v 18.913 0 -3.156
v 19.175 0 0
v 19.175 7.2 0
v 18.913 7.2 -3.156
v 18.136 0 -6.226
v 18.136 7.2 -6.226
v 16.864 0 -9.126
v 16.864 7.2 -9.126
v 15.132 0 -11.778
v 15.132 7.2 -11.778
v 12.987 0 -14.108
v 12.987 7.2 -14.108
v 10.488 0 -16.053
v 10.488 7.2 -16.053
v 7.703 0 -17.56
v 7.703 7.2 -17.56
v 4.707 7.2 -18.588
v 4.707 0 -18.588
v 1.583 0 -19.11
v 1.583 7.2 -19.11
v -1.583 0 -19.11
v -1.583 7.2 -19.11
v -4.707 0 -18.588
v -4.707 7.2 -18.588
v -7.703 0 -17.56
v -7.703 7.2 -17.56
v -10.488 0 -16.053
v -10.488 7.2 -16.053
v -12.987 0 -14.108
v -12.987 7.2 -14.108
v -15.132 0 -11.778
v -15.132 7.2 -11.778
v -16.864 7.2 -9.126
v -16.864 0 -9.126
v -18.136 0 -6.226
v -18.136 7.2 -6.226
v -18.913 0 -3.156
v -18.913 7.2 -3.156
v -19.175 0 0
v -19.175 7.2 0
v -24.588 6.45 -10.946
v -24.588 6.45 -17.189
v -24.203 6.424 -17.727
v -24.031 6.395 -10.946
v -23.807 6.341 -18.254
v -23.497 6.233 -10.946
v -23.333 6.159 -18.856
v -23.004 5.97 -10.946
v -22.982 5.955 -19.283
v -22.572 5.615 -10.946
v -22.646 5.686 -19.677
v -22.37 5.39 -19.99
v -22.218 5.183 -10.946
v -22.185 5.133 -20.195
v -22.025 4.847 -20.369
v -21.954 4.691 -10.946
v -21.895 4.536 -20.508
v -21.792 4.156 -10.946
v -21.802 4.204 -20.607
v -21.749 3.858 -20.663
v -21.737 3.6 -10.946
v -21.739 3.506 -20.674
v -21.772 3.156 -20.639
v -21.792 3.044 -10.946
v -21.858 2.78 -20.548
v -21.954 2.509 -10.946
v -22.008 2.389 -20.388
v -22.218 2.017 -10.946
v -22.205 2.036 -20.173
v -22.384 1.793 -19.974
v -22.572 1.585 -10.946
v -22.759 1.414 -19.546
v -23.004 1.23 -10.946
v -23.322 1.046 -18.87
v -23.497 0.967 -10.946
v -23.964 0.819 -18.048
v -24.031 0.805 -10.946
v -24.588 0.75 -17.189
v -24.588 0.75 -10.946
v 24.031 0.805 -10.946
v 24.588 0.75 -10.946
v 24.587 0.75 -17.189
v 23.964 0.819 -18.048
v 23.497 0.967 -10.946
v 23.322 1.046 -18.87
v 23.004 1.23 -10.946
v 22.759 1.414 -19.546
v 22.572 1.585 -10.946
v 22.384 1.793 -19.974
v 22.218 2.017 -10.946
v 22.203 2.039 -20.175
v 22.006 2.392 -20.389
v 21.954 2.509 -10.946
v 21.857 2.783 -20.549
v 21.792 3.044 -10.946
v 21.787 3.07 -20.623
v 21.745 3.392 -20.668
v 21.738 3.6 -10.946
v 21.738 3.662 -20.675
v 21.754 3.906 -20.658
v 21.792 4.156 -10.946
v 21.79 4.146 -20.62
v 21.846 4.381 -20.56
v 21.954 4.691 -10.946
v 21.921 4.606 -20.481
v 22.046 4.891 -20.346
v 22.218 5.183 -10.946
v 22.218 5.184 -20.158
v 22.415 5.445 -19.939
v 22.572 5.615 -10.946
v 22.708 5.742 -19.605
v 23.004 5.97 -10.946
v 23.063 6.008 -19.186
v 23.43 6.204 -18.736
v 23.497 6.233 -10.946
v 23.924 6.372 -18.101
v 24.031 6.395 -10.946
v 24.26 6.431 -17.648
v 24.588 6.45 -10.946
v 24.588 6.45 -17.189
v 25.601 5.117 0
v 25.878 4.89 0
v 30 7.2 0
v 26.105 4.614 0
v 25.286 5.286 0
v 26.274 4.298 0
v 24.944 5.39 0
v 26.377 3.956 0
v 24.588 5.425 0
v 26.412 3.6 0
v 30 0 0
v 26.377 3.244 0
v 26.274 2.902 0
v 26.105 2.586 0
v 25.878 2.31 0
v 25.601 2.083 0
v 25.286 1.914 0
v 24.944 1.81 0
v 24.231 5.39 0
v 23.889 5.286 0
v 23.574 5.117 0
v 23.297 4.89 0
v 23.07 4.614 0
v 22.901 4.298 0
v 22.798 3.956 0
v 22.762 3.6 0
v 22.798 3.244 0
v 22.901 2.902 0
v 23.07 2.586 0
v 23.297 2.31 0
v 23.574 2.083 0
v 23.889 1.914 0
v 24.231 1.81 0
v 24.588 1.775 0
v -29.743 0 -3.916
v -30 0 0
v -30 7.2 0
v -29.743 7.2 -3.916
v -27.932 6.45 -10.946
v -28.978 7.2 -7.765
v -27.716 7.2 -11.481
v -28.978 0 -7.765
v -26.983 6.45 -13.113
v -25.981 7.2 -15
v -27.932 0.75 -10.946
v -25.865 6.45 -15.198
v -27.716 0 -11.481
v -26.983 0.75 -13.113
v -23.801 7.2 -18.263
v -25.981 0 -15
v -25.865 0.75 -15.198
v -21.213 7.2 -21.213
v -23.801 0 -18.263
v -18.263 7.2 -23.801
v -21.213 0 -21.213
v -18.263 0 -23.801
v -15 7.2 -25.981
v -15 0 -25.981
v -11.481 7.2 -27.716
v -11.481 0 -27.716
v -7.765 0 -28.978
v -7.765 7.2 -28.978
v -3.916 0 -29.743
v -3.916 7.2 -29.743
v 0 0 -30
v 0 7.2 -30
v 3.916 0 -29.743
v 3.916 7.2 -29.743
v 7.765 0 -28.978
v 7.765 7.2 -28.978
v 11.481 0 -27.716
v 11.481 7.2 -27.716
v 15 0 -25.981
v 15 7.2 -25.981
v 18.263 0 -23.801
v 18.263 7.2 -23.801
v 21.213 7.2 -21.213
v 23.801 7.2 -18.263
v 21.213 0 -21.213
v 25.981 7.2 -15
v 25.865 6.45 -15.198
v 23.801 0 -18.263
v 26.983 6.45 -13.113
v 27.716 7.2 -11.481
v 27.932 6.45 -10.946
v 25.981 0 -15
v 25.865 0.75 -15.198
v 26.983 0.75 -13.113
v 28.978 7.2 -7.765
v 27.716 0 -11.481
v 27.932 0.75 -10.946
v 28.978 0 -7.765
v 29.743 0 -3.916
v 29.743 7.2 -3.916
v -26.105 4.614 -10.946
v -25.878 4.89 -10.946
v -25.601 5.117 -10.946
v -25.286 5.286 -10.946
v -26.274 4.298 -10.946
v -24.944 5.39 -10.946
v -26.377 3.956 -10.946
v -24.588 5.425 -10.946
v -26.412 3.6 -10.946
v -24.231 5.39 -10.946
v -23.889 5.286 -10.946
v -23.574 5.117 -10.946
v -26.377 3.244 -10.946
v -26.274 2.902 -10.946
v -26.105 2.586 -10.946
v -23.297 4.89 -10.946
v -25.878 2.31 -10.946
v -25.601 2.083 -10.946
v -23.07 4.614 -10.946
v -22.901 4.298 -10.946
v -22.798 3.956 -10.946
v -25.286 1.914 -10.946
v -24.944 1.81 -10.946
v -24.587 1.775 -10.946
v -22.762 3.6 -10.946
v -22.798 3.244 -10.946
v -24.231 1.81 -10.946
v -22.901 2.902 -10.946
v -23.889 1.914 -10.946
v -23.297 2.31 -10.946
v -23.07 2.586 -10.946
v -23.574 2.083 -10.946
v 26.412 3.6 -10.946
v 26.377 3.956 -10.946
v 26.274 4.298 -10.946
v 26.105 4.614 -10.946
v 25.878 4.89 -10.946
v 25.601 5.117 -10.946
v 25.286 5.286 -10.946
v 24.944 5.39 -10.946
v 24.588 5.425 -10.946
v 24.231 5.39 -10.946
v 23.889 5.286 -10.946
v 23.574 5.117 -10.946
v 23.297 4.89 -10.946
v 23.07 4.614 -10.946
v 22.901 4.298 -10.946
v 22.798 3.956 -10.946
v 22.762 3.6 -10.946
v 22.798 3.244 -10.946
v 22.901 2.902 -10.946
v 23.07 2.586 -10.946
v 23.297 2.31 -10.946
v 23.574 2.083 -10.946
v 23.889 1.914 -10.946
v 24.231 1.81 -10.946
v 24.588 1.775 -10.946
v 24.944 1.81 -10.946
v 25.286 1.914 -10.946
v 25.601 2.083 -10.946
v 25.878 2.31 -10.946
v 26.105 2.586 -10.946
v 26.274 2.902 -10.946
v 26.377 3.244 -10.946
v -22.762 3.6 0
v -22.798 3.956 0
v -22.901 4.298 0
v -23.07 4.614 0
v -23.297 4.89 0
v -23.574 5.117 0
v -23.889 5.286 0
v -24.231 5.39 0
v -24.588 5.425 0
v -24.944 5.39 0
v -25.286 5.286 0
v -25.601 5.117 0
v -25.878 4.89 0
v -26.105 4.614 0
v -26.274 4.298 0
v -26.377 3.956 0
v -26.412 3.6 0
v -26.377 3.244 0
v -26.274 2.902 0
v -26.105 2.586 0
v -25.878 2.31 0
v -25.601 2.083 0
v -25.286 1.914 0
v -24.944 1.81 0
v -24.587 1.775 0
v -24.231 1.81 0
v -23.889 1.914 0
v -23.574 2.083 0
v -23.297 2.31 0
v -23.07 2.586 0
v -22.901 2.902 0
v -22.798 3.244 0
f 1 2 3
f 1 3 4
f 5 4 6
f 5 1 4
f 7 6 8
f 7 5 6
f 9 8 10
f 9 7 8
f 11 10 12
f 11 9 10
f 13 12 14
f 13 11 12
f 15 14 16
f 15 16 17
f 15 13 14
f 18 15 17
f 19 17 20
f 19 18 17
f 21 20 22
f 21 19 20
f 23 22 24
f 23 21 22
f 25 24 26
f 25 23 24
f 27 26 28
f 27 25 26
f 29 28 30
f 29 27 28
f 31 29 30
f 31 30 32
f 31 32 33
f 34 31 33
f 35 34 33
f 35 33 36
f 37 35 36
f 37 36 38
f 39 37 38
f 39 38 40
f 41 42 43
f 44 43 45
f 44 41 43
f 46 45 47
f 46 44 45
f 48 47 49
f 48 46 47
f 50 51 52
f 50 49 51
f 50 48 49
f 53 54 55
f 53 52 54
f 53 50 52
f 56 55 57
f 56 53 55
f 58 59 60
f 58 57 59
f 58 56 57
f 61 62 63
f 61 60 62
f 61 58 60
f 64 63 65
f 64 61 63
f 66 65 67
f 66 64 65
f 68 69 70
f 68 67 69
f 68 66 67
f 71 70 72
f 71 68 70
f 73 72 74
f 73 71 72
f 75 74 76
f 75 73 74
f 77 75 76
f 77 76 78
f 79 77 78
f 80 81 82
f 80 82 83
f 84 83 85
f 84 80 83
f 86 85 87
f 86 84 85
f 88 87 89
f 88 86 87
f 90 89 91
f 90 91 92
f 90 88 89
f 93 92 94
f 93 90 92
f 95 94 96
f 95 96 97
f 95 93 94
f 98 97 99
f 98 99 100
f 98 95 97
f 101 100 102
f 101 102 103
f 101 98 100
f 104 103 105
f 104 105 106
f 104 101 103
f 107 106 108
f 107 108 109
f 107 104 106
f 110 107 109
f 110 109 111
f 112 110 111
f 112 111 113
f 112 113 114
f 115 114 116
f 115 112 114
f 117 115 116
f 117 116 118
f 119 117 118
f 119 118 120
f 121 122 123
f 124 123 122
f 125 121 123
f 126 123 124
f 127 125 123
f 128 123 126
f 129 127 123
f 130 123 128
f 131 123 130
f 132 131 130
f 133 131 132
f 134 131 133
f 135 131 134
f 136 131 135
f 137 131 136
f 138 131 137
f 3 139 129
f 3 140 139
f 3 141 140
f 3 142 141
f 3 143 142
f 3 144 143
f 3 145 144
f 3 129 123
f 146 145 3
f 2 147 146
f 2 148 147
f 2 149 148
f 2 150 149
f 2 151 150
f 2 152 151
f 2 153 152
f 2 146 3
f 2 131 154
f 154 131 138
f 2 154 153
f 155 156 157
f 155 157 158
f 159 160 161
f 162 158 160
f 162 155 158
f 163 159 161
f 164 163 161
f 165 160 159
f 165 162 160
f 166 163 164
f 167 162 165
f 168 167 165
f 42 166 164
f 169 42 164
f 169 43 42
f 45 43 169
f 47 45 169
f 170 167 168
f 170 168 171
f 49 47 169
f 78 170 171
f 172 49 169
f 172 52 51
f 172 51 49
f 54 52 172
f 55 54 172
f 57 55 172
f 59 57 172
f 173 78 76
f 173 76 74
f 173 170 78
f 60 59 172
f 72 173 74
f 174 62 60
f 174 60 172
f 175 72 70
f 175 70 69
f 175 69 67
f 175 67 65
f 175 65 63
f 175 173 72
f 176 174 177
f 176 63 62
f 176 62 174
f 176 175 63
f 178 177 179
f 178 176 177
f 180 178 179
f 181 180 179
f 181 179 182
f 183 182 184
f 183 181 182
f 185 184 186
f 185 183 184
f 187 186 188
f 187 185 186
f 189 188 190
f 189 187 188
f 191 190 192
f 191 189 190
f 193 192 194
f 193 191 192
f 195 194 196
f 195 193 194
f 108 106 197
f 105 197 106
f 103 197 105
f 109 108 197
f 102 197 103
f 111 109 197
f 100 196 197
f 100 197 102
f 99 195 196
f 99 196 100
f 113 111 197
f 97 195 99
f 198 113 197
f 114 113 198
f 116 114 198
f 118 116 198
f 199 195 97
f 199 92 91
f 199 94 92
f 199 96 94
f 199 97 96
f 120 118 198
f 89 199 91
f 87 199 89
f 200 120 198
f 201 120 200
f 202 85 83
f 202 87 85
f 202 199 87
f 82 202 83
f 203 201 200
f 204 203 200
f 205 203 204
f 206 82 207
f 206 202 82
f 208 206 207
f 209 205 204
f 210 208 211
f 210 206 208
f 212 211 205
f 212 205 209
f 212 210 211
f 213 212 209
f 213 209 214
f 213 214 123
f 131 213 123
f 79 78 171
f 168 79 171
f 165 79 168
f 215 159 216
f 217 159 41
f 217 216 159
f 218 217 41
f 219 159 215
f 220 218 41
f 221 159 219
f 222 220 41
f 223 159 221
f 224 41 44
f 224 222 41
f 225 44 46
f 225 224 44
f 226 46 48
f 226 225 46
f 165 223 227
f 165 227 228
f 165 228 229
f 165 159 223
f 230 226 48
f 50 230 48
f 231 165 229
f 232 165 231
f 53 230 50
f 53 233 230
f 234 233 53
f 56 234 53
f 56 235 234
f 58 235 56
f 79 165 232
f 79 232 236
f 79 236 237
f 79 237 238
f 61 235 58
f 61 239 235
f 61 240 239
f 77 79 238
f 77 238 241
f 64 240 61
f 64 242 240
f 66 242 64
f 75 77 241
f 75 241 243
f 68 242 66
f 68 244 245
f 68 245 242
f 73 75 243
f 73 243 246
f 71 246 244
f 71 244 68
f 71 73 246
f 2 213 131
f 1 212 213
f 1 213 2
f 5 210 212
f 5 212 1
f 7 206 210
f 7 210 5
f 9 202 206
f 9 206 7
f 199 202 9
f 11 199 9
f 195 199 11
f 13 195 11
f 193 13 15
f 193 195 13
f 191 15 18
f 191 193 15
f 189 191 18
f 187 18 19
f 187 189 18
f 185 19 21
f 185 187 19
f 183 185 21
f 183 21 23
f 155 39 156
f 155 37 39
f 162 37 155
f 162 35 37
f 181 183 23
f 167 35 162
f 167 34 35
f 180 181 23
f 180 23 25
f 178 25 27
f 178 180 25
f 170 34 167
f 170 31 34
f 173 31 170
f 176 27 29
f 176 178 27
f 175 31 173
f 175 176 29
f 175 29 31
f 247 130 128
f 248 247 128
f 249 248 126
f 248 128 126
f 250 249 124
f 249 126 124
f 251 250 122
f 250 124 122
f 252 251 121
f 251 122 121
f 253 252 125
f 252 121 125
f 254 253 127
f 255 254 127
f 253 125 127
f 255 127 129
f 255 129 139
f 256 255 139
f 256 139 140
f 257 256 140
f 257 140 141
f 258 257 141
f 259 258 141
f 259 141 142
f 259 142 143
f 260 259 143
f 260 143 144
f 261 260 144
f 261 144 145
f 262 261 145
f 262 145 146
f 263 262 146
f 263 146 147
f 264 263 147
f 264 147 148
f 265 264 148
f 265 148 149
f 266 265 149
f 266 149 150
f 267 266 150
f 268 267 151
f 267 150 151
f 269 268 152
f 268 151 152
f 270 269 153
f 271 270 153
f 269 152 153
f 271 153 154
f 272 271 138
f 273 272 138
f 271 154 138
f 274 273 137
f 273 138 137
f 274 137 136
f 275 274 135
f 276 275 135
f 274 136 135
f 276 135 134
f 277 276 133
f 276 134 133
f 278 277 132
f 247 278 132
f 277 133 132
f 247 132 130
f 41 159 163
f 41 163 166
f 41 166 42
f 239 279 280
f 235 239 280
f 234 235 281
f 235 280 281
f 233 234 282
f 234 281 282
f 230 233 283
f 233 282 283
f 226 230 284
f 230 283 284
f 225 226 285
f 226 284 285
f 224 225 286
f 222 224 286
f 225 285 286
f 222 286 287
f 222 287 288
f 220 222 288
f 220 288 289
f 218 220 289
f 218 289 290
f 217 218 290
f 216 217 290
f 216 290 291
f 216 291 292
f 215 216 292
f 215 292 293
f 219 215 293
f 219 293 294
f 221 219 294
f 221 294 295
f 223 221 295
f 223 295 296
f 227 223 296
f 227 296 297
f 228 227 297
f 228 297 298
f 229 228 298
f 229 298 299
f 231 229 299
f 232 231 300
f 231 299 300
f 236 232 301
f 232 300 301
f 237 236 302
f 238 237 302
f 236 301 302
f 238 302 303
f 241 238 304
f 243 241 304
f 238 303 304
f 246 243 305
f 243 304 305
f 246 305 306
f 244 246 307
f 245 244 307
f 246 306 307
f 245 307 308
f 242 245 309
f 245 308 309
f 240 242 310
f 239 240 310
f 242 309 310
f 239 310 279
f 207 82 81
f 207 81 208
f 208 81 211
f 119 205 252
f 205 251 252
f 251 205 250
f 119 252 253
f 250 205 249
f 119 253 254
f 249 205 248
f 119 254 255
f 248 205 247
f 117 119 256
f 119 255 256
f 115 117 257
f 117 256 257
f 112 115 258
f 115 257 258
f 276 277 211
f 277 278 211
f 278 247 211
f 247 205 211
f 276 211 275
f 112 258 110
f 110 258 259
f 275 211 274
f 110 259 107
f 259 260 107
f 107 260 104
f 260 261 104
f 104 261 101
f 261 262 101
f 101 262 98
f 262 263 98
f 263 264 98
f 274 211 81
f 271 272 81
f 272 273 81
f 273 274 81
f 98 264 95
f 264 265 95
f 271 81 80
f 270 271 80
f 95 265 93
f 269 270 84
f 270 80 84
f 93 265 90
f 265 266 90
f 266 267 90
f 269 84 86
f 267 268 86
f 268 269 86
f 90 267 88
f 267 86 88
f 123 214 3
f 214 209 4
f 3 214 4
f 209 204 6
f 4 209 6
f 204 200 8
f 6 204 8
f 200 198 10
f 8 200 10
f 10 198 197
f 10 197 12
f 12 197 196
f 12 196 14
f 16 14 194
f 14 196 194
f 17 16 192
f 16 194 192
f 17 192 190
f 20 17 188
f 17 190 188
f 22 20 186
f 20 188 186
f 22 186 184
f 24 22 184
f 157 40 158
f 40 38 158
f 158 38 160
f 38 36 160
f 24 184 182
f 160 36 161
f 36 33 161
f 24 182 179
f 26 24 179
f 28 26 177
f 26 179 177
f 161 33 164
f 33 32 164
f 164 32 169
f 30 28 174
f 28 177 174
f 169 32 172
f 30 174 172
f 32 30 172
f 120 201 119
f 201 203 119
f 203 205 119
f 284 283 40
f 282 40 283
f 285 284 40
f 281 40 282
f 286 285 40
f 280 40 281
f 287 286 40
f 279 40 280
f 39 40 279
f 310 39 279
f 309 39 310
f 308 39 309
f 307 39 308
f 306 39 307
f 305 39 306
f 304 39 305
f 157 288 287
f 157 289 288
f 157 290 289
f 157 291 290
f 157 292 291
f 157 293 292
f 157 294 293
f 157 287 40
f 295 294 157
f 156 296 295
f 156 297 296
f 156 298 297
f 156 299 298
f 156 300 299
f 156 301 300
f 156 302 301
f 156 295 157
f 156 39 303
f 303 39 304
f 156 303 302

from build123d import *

# Parameters (mm, degrees)
BOSS_EXTRUDE1_DEPTH     = 7.2
SKETCH2_R               = 1.825
CUT_EXTRUDE1_DEPTH      = 47.2
CUT_EXTRUDE3_DEPTH      = 5
CUT_EXTRUDE3_DEPTH_BACK = 5.5
SKETCH3_R               = 2.85
CUT_EXTRUDE4_DEPTH      = 20


with BuildPart() as part:
    # Sketch1 → Boss-Extrude1 (new body)
    with BuildSketch(Plane(origin=(0, 0, 0), x_dir=(1, 0, 0), z_dir=(0, 1, 0))):
        with BuildLine():
            Line((-19.175, 0), (-30, 0))
            ThreePointArc((-30, 0), (0, 30), (30, 0))
            Line((30, 0), (19.175, 0))
            ThreePointArc((19.175, 0), (0, 19.175), (-19.175, 0))
        make_face()
    extrude(amount=BOSS_EXTRUDE1_DEPTH)

    # Sketch2 → Cut-Extrude1 (cut)
    with BuildSketch(Plane.XY):
        with Locations((-24.5875, 3.6)):
            Circle(SKETCH2_R)
        with Locations((24.5875, 3.6)):
            Circle(SKETCH2_R)
    extrude(amount=-CUT_EXTRUDE1_DEPTH, mode=Mode.SUBTRACT)

    # Sketch3 → Cut-Extrude3 (cut, two sides: drawn at the far end of the back side and taken through both)
    with BuildSketch(Plane(origin=(0, 0, -16.445655164), x_dir=(0, -1, 0), z_dir=(0, 0, -1)).offset(-CUT_EXTRUDE3_DEPTH_BACK)):
        with Locations(Location((-3.6, 24.5875, 0), (0, 0, 270))):
            Circle(SKETCH3_R)
        with Locations(Location((-3.6, -24.5875, 0), (0, 0, 270))):
            Circle(SKETCH3_R)
    extrude(amount=CUT_EXTRUDE3_DEPTH + CUT_EXTRUDE3_DEPTH_BACK, mode=Mode.SUBTRACT)

    # Sketch4 → Cut-Extrude4 (cut)
    with BuildSketch(Plane(origin=(0, 0, -10.945655164), x_dir=(1, 0, 0), z_dir=(0, 0, -1))):
        with BuildLine():
            Line((-30, -0.75), (-30, -6.45))
            Line((-30, -6.45), (-24.5875, -6.45))
            ThreePointArc((-24.5875, -6.45), (-21.7375, -3.6), (-24.5875, -0.75))
            Line((-24.5875, -0.75), (-30, -0.75))
        make_face()
        with BuildLine():
            Line((30, -0.75), (30, -6.45))
            Line((30, -6.45), (24.5875, -6.45))
            ThreePointArc((24.5875, -6.45), (21.7375, -3.6), (24.5875, -0.75))
            Line((24.5875, -0.75), (30, -0.75))
        make_face()
    extrude(amount=CUT_EXTRUDE4_DEPTH, mode=Mode.SUBTRACT)


solid = part.part
